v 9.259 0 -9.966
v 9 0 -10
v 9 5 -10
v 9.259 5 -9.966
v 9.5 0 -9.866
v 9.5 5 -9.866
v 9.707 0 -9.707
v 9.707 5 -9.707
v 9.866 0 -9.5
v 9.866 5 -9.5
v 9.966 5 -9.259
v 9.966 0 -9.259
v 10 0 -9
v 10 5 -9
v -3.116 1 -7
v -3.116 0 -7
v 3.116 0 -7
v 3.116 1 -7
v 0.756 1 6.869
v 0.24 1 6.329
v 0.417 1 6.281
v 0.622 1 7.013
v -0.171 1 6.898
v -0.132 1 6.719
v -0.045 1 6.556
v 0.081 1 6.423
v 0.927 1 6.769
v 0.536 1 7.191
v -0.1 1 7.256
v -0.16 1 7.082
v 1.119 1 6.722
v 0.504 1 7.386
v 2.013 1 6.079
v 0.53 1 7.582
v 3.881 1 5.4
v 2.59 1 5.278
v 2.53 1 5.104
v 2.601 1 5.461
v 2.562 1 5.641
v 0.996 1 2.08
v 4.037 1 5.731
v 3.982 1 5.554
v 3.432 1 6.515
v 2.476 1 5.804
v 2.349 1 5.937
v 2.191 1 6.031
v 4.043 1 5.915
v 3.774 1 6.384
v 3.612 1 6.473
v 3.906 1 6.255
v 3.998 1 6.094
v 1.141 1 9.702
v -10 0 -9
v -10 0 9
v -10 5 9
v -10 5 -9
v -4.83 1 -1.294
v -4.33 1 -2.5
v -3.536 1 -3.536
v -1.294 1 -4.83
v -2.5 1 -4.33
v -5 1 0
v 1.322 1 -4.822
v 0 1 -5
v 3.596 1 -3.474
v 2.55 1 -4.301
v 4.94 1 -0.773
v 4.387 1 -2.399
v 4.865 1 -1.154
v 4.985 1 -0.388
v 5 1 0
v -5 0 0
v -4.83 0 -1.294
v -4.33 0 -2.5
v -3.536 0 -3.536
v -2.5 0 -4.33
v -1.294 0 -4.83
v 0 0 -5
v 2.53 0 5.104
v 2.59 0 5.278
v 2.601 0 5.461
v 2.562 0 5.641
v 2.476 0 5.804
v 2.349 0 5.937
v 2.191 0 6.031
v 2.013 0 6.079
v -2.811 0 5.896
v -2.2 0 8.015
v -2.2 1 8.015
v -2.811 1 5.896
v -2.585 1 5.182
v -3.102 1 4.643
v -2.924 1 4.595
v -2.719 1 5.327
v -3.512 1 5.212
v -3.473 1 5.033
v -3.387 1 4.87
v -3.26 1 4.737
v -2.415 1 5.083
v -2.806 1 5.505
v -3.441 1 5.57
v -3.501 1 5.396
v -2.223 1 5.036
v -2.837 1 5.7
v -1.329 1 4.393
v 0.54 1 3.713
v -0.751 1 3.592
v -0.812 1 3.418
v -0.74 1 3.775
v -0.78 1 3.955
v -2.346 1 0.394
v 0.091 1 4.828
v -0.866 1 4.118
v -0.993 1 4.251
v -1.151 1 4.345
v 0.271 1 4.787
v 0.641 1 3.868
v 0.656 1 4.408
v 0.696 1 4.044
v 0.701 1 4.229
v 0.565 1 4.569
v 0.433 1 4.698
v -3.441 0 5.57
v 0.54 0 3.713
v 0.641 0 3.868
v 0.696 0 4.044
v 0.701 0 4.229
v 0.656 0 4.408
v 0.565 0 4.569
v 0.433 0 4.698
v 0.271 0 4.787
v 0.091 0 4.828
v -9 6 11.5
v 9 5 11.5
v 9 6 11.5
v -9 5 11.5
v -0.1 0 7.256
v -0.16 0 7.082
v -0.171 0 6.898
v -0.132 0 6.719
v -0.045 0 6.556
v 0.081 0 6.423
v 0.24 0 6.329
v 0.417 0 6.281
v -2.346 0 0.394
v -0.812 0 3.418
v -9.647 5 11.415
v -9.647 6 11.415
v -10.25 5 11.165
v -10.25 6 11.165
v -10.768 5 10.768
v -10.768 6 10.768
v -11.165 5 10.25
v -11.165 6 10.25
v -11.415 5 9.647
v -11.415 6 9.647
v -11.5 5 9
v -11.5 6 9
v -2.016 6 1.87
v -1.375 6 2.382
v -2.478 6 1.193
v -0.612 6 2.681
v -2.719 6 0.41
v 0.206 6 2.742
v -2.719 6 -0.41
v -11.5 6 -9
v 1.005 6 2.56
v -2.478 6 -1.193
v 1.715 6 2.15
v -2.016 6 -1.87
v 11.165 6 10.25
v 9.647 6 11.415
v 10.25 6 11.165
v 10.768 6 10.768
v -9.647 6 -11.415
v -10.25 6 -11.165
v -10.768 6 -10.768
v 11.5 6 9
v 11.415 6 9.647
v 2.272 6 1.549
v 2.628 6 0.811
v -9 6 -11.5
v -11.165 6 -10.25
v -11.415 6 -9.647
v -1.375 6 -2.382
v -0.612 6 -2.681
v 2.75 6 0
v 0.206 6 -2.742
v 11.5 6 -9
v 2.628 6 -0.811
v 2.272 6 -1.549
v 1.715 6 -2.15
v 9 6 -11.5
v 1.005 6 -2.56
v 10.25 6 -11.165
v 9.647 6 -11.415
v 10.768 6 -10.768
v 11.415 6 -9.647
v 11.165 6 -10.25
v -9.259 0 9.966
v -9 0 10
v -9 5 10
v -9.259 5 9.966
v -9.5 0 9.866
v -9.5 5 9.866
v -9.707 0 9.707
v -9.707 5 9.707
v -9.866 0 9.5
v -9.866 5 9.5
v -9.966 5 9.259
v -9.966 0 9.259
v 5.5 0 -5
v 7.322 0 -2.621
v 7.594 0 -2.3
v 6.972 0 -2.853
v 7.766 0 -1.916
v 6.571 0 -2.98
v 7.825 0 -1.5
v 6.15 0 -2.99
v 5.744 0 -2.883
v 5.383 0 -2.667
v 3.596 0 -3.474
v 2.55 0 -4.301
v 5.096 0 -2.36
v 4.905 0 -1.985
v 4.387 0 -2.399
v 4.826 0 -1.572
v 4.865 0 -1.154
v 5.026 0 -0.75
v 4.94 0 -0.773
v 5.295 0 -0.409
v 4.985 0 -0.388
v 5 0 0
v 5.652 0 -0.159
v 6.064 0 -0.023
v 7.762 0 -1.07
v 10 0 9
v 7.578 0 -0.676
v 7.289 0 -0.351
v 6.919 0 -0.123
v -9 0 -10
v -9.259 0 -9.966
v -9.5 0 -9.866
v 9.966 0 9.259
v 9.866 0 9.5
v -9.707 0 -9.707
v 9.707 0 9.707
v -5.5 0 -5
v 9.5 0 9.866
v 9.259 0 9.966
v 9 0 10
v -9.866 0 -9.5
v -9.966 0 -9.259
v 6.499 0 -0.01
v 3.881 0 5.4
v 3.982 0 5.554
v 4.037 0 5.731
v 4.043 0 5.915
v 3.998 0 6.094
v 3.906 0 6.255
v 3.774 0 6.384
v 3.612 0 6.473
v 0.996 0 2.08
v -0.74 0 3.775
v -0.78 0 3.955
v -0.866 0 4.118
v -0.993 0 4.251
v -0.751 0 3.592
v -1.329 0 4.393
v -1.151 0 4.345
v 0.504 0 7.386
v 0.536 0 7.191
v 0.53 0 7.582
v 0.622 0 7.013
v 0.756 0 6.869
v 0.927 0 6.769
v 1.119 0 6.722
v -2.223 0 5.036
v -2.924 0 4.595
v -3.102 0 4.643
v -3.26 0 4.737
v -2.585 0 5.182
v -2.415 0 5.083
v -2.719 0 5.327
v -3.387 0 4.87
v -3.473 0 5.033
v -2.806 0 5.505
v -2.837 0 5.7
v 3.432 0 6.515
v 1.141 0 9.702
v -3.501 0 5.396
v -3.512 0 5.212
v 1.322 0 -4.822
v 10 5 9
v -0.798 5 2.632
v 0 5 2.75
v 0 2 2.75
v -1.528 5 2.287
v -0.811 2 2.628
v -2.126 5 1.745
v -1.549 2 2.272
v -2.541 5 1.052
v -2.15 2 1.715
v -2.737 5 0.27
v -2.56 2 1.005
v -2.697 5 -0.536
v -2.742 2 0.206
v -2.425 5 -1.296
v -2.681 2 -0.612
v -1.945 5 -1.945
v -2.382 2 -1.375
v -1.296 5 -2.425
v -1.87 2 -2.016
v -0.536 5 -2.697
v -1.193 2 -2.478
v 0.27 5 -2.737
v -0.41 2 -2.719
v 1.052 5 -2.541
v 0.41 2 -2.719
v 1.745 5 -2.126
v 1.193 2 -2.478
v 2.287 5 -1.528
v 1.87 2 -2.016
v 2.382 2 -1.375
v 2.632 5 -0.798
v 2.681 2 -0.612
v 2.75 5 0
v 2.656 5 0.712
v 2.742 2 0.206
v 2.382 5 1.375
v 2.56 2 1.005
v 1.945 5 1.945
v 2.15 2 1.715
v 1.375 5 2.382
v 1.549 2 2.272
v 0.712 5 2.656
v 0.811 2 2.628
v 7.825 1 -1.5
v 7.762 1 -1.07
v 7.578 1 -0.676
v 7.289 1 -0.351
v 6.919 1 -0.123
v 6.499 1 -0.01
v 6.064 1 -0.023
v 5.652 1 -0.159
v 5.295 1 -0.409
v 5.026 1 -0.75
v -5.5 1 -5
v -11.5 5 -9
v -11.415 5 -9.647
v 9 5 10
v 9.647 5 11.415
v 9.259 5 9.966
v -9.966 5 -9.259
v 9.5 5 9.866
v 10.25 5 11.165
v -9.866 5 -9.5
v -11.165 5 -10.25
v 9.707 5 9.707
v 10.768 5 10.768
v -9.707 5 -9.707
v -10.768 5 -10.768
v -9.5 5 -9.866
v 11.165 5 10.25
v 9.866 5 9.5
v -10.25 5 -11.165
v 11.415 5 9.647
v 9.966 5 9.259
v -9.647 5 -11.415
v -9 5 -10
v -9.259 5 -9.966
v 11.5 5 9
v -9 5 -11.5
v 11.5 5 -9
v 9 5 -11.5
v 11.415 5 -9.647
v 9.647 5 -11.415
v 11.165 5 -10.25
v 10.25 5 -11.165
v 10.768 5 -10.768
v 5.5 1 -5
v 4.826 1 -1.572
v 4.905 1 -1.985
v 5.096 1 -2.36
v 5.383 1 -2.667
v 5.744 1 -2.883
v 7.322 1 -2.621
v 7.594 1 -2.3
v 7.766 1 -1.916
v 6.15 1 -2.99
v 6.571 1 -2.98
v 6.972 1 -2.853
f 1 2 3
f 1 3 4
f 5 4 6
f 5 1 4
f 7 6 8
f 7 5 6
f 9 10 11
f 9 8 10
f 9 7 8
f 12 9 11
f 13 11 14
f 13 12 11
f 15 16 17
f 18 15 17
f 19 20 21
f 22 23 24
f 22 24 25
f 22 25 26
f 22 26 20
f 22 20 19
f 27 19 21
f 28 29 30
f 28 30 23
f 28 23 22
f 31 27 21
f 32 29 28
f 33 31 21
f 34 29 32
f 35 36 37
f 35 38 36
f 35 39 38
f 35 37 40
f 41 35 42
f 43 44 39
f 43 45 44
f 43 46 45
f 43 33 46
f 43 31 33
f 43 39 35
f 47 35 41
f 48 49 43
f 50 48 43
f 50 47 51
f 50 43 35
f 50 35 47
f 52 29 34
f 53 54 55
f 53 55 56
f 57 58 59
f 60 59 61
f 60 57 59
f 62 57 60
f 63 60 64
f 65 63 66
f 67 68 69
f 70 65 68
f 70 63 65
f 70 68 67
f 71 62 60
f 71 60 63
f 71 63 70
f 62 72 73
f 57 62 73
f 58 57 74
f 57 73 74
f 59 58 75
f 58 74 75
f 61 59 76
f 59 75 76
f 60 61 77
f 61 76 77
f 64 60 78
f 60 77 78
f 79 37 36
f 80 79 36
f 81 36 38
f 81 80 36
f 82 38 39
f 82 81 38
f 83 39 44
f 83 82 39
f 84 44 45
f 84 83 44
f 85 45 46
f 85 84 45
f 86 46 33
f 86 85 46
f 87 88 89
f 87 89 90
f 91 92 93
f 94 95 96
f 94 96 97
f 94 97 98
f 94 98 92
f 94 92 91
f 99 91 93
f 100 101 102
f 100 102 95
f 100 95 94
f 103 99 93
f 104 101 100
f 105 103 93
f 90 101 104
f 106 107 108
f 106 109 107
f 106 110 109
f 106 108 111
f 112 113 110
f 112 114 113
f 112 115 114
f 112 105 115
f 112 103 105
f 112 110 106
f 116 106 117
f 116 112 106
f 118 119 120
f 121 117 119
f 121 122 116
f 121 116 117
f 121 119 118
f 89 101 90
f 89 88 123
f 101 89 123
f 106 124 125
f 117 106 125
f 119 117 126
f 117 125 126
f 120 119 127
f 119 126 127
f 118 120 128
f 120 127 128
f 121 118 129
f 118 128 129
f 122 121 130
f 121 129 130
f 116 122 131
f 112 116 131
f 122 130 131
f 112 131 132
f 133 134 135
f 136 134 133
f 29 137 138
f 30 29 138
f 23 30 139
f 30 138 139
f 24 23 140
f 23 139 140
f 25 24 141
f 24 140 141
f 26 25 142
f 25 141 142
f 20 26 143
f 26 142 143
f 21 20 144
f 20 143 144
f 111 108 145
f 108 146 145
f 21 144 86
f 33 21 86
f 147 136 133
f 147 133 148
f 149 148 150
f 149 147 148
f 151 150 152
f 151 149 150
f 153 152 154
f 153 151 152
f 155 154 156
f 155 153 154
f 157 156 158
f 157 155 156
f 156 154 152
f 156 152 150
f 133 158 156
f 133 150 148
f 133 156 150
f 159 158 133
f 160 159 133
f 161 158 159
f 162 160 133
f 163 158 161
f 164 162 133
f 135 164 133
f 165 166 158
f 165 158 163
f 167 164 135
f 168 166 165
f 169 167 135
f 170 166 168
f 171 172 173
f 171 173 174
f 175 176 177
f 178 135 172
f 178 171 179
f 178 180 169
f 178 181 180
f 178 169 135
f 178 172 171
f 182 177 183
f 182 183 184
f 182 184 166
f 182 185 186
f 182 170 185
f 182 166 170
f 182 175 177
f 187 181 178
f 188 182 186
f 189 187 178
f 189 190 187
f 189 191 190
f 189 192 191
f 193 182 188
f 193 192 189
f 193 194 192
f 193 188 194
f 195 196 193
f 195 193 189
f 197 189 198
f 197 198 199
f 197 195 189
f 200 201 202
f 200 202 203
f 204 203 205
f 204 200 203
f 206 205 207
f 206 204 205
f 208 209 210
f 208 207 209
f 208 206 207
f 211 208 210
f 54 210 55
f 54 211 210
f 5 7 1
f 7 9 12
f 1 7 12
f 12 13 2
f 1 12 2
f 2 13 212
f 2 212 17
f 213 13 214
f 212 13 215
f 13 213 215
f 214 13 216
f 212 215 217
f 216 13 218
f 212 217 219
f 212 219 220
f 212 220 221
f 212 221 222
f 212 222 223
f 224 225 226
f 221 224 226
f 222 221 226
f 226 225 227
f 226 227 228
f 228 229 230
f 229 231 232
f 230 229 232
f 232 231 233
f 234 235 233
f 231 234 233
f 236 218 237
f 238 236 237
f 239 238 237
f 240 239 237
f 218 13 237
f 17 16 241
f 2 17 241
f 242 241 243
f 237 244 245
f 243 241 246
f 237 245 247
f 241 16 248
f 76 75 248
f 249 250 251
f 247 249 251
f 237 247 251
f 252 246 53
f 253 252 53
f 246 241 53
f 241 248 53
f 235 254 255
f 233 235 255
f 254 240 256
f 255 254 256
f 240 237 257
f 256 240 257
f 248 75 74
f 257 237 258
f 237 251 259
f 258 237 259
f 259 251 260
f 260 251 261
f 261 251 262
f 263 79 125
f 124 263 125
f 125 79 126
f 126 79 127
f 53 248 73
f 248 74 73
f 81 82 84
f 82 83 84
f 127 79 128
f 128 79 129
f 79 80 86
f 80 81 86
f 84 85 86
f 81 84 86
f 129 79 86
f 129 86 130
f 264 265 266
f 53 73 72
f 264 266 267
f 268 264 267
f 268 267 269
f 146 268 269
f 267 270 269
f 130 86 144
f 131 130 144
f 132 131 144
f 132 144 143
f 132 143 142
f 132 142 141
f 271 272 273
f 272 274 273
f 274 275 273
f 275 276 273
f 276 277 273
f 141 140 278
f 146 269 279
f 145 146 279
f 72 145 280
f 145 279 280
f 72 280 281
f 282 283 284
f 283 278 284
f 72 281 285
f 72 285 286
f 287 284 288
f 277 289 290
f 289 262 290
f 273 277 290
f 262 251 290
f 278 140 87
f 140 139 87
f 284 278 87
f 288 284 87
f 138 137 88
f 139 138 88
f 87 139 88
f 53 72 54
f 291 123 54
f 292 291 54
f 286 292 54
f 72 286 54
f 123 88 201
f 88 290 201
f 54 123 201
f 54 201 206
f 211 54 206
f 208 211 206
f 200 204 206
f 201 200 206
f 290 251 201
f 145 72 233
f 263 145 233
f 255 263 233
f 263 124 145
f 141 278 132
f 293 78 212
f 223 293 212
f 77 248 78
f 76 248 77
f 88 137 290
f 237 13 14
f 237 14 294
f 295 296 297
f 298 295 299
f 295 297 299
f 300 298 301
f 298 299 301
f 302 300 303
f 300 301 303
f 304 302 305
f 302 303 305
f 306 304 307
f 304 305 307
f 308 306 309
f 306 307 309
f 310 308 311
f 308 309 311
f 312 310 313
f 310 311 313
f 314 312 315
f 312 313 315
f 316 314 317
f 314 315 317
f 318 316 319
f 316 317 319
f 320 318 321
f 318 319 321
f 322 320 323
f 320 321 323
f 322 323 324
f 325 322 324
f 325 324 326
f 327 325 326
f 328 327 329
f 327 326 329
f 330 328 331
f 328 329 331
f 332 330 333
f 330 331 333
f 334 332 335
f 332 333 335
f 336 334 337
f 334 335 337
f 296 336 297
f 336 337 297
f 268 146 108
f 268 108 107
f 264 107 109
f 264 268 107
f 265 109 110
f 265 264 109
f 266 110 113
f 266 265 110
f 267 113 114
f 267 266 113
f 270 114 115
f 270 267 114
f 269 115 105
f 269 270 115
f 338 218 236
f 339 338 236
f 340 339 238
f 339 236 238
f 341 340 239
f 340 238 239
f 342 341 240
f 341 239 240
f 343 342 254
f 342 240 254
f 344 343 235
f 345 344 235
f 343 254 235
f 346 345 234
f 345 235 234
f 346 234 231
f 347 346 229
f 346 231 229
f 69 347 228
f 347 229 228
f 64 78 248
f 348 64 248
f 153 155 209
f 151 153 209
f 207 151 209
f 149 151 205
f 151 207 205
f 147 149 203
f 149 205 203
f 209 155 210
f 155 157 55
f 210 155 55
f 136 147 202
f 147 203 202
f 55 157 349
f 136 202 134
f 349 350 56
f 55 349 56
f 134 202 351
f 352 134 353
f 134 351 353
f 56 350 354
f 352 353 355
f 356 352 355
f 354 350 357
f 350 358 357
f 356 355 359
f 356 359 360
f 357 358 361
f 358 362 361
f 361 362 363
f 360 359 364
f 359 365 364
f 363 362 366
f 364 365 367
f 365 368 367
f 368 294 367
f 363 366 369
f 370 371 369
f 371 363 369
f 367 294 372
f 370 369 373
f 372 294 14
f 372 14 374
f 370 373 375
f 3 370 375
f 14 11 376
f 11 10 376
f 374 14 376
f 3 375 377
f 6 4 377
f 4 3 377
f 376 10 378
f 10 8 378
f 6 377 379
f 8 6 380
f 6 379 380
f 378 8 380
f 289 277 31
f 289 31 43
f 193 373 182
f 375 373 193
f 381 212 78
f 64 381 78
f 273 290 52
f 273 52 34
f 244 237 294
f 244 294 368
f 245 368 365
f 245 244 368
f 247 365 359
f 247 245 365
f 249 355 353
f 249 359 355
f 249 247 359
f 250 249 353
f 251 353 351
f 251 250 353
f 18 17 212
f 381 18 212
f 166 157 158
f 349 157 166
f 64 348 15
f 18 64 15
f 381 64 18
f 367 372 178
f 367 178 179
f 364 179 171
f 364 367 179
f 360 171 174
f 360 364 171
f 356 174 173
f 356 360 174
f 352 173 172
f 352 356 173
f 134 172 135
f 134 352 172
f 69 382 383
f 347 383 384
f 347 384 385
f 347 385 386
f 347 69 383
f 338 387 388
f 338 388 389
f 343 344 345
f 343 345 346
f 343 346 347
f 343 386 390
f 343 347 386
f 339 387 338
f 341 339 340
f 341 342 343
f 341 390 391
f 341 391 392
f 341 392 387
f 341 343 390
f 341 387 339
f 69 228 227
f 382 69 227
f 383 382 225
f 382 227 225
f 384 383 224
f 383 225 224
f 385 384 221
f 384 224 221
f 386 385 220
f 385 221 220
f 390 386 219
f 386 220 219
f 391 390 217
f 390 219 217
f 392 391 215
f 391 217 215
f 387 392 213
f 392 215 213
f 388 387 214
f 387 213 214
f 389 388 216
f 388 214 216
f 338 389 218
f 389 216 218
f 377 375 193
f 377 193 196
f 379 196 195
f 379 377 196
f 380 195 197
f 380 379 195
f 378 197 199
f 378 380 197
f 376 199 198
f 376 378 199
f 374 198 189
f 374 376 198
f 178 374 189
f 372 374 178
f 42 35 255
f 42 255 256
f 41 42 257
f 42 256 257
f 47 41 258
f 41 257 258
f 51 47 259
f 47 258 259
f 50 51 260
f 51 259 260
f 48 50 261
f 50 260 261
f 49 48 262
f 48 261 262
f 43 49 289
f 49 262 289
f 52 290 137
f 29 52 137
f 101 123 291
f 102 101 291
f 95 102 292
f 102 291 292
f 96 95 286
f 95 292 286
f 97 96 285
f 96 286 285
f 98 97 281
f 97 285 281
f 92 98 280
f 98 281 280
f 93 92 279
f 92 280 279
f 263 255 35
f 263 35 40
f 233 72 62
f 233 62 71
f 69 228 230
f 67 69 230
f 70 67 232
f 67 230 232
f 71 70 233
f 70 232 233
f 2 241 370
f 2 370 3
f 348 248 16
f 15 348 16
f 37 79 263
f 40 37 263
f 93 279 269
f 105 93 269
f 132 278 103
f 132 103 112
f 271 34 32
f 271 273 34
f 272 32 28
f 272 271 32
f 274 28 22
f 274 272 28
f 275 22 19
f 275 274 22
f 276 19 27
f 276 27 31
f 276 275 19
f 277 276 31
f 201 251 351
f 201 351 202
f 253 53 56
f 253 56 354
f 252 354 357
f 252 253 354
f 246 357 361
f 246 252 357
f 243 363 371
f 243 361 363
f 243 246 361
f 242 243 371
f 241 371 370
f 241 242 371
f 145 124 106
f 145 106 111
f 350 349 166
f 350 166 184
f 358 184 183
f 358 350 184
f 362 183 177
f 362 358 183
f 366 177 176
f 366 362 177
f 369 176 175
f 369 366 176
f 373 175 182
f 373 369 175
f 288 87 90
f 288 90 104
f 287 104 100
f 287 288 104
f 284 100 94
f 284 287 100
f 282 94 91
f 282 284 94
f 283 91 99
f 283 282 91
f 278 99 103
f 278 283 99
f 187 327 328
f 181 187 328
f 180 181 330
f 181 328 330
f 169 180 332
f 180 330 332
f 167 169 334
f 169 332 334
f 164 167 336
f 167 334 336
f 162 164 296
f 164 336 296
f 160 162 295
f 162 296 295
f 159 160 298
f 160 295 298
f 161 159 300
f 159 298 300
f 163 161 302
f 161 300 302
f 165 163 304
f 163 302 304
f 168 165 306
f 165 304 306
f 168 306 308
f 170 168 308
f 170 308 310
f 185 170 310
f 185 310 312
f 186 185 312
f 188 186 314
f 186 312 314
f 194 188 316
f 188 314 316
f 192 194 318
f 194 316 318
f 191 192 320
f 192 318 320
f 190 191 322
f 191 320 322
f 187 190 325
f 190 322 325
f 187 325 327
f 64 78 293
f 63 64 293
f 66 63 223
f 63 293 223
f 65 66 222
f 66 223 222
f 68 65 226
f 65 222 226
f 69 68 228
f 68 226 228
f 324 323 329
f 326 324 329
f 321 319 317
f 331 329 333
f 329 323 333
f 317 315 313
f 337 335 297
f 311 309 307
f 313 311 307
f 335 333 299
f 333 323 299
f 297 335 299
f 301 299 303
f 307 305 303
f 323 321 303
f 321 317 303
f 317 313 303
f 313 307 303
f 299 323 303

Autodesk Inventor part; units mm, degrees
ref_plane "YZ Plane" through (0, 0, 0) normal (1, 0, 0) x (0, 1, 0)
ref_plane "XZ Plane" through (0, 0, 0) normal (0, 1, 0) x (-1, 0, 0)
ref_plane "XY Plane" through (0, 0, 0) normal (0, 0, 1) x (1, 0, 0)
sketch "Sketch1" plane through (0, 0, 0) normal (0, 1, 0) x (-1, 0, 0)
  line L0 (9, -10) -> (-9, -10)
  line L1 (-10, -9) -> (-10, 9)
  line L2 (-9, 10) -> (9, 10)
  line L3 (10, 9) -> (10, -9)
  line L4 (10, 10) -> (-10, -10) construction
  line L5 (10, -10) -> (-10, 10) construction
  arc A0 (10, 9) -> (9, 10) centre (9, 9) ccw
  arc A1 (9, -10) -> (10, -9) centre (9, -9) ccw
  arc A2 (-10, -9) -> (-9, -10) centre (-9, -9) ccw
  arc A3 (-9, 10) -> (-10, 9) centre (-9, 9) ccw
  point P0 (0, 0)
  point P1 (0, 0)
  dimension "d7" = 20
  dimension "d9" = 20
  dimension "d10" = 1
extrude "Extrusion1" add sketch "Sketch1" along normal blind 5
sketch "Sketch2" plane through (0, 5, 0) normal (0, 1, 0) x (1, 0, 0)
  line L0 (-10, 9) -> (-10, -9) projected
  arc A0 (-10, -9) -> (-9, -10) centre (-9, -9) ccw projected
  line L1 (-9, -10) -> (9, -10) projected
  arc A1 (9, -10) -> (10, -9) centre (9, -9) ccw projected
  line L2 (10, -9) -> (10, 9) projected
  arc A2 (10, 9) -> (9, 10) centre (9, 9) ccw projected
  line L3 (9, 10) -> (-9, 10) projected
  arc A3 (-9, 10) -> (-10, 9) centre (-9, 9) ccw projected
  line L4 (9, -11.5) -> (-9, -11.5)
  arc A4 (-11.5, -9) -> (-9, -11.5) centre (-9, -9) ccw
  line L5 (-11.5, -9) -> (-11.5, 9)
  arc A5 (-9, 11.5) -> (-11.5, 9) centre (-9, 9) ccw
  line L6 (-9, 11.5) -> (9, 11.5)
  arc A6 (11.5, 9) -> (9, 11.5) centre (9, 9) ccw
  line L7 (11.5, 9) -> (11.5, -9)
  arc A7 (9, -11.5) -> (11.5, -9) centre (9, -9) ccw
  circle A8 centre (0, 0) radius 2.75
  dimension "d16" = 1.5
  dimension "d19" = 5.5
extrude "Extrusion3" add sketch "Sketch2" along normal blind 1 contours A3 L3 A2 L2 A1 L1 A0 L0 | L4 A4 L5 A5 L6 A6 L7 A7
sketch "Sketch3" plane through (0, 0, 0) normal (0, -1, 0) x (1, 0, 0)
  line L0 (-3.1165, -7) -> (3.1165, -7)
  line L1 (3.1165, -7) -> (5.5, -5)
  line L2 (5.5, -5) -> (-5.5, -5)
  line L3 (-5.5, -5) -> (-3.1165, -7)
  line L4 (0, 0) -> (0, -4.6532) construction
  arc A0 (-5, 0) -> (5, 0) centre (0, 0) ccw
  circle A1 centre (6.3246, -1.5) radius 1.5
  line L5 (-5, 0) -> (5, 0)
  line L6 (-2.2003, 8.0155) -> (-3.4413, 5.57)
  line L7 (-2.9242, 4.5949) -> (-1.3286, 4.3927)
  line L8 (-0.8115, 3.4176) -> (-2.3458, 0.3942)
  line L9 (-2.2003, 8.0155) -> (-2.8111, 5.8955)
  line L10 (-2.2229, 5.0363) -> (0.0906, 4.8285)
  line L11 (0.5397, 3.7134) -> (-2.3458, 0.3942)
  arc A2 (-2.8111, 5.8955) -> (-2.2229, 5.0363) centre (-2.1625, 5.7086) ccw
  arc A3 (0.5397, 3.7134) -> (0.0906, 4.8285) centre (0.0303, 4.1562) ccw
  arc A4 (-0.8115, 3.4176) -> (-1.3286, 4.3927) centre (-1.4135, 3.723) ccw
  arc A5 (-3.4413, 5.57) -> (-2.9242, 4.5949) centre (-2.8393, 5.2646) ccw
  line L12 (1.1412, 9.7016) -> (-0.0998, 7.2561)
  line L13 (0.4173, 6.281) -> (2.0129, 6.0788)
  line L14 (2.53, 5.1037) -> (0.9957, 2.0803)
  line L15 (1.1412, 9.7016) -> (0.5304, 7.5816)
  line L16 (1.1186, 6.7224) -> (3.4321, 6.5146)
  line L17 (3.8812, 5.3995) -> (0.9957, 2.0803)
  arc A6 (0.5304, 7.5816) -> (1.1186, 6.7224) centre (1.179, 7.3947) ccw
  arc A7 (3.8812, 5.3995) -> (3.4321, 6.5146) centre (3.3717, 5.8423) ccw
  arc A8 (2.53, 5.1037) -> (2.0129, 6.0788) centre (1.928, 5.4091) ccw
  arc A9 (-0.0998, 7.2561) -> (0.4173, 6.281) centre (0.5022, 6.9507) ccw
  point P0 (0, -7)
  point P1 (0, -5)
  dimension "d68" = 10
  dimension "d69" = 11
  dimension "d70" = 2
  dimension "d71" = 100
  dimension "d72" = 3
  dimension "d73" = 0.675
  dimension "d74" = 0.675
extrude "Extrusion7" cut sketch "Sketch3" against normal blind 1
hole "Hole1" at (0, 5, 0) direction (0, -1, 0) diameter 5.5 depth 3
equation "\"d7\" = button_side"
equation "\"d9\" = d7"
equation "\"d68\" = 0.5 * button_side"
equation "\"d69\" = 1.1 * d68"
equation "\"d70\" = 0.2 * d68"
equation "\"d72\" = 0.3 * d68"
equation "\"d0\" = 122"
equation "\"d1\" = 77"
equation "\"d4\" = 19"
equation "\"d5\" = 1"
equation "\"d8\" = 25"
equation "\"d13\" = 1.5"
equation "\"d14\" = 0"
equation "\"d15\" = 2"
equation "\"d30\" = 3.1"
equation "\"d31\" = 3"
equation "\"d33\" = 3"
equation "\"d34\" = 2"
equation "\"d36\" = 3"
equation "\"d38\" = 90deg"
equation "\"d39\" = 8"
equation "\"d40\" = 118deg"
equation "\"d44\" = 0"
equation "\"d45\" = 1.2"
equation "\"d46\" = 2"
equation "\"d47\" = 0"
equation "\"d50\" = 25"
equation "\"button_side\" = 20"
equation "\"d3\" = 1.01 * button_side"
equation "\"d2\" = d3"
properties part number "button3" material "Bronze, Soft Tin"
